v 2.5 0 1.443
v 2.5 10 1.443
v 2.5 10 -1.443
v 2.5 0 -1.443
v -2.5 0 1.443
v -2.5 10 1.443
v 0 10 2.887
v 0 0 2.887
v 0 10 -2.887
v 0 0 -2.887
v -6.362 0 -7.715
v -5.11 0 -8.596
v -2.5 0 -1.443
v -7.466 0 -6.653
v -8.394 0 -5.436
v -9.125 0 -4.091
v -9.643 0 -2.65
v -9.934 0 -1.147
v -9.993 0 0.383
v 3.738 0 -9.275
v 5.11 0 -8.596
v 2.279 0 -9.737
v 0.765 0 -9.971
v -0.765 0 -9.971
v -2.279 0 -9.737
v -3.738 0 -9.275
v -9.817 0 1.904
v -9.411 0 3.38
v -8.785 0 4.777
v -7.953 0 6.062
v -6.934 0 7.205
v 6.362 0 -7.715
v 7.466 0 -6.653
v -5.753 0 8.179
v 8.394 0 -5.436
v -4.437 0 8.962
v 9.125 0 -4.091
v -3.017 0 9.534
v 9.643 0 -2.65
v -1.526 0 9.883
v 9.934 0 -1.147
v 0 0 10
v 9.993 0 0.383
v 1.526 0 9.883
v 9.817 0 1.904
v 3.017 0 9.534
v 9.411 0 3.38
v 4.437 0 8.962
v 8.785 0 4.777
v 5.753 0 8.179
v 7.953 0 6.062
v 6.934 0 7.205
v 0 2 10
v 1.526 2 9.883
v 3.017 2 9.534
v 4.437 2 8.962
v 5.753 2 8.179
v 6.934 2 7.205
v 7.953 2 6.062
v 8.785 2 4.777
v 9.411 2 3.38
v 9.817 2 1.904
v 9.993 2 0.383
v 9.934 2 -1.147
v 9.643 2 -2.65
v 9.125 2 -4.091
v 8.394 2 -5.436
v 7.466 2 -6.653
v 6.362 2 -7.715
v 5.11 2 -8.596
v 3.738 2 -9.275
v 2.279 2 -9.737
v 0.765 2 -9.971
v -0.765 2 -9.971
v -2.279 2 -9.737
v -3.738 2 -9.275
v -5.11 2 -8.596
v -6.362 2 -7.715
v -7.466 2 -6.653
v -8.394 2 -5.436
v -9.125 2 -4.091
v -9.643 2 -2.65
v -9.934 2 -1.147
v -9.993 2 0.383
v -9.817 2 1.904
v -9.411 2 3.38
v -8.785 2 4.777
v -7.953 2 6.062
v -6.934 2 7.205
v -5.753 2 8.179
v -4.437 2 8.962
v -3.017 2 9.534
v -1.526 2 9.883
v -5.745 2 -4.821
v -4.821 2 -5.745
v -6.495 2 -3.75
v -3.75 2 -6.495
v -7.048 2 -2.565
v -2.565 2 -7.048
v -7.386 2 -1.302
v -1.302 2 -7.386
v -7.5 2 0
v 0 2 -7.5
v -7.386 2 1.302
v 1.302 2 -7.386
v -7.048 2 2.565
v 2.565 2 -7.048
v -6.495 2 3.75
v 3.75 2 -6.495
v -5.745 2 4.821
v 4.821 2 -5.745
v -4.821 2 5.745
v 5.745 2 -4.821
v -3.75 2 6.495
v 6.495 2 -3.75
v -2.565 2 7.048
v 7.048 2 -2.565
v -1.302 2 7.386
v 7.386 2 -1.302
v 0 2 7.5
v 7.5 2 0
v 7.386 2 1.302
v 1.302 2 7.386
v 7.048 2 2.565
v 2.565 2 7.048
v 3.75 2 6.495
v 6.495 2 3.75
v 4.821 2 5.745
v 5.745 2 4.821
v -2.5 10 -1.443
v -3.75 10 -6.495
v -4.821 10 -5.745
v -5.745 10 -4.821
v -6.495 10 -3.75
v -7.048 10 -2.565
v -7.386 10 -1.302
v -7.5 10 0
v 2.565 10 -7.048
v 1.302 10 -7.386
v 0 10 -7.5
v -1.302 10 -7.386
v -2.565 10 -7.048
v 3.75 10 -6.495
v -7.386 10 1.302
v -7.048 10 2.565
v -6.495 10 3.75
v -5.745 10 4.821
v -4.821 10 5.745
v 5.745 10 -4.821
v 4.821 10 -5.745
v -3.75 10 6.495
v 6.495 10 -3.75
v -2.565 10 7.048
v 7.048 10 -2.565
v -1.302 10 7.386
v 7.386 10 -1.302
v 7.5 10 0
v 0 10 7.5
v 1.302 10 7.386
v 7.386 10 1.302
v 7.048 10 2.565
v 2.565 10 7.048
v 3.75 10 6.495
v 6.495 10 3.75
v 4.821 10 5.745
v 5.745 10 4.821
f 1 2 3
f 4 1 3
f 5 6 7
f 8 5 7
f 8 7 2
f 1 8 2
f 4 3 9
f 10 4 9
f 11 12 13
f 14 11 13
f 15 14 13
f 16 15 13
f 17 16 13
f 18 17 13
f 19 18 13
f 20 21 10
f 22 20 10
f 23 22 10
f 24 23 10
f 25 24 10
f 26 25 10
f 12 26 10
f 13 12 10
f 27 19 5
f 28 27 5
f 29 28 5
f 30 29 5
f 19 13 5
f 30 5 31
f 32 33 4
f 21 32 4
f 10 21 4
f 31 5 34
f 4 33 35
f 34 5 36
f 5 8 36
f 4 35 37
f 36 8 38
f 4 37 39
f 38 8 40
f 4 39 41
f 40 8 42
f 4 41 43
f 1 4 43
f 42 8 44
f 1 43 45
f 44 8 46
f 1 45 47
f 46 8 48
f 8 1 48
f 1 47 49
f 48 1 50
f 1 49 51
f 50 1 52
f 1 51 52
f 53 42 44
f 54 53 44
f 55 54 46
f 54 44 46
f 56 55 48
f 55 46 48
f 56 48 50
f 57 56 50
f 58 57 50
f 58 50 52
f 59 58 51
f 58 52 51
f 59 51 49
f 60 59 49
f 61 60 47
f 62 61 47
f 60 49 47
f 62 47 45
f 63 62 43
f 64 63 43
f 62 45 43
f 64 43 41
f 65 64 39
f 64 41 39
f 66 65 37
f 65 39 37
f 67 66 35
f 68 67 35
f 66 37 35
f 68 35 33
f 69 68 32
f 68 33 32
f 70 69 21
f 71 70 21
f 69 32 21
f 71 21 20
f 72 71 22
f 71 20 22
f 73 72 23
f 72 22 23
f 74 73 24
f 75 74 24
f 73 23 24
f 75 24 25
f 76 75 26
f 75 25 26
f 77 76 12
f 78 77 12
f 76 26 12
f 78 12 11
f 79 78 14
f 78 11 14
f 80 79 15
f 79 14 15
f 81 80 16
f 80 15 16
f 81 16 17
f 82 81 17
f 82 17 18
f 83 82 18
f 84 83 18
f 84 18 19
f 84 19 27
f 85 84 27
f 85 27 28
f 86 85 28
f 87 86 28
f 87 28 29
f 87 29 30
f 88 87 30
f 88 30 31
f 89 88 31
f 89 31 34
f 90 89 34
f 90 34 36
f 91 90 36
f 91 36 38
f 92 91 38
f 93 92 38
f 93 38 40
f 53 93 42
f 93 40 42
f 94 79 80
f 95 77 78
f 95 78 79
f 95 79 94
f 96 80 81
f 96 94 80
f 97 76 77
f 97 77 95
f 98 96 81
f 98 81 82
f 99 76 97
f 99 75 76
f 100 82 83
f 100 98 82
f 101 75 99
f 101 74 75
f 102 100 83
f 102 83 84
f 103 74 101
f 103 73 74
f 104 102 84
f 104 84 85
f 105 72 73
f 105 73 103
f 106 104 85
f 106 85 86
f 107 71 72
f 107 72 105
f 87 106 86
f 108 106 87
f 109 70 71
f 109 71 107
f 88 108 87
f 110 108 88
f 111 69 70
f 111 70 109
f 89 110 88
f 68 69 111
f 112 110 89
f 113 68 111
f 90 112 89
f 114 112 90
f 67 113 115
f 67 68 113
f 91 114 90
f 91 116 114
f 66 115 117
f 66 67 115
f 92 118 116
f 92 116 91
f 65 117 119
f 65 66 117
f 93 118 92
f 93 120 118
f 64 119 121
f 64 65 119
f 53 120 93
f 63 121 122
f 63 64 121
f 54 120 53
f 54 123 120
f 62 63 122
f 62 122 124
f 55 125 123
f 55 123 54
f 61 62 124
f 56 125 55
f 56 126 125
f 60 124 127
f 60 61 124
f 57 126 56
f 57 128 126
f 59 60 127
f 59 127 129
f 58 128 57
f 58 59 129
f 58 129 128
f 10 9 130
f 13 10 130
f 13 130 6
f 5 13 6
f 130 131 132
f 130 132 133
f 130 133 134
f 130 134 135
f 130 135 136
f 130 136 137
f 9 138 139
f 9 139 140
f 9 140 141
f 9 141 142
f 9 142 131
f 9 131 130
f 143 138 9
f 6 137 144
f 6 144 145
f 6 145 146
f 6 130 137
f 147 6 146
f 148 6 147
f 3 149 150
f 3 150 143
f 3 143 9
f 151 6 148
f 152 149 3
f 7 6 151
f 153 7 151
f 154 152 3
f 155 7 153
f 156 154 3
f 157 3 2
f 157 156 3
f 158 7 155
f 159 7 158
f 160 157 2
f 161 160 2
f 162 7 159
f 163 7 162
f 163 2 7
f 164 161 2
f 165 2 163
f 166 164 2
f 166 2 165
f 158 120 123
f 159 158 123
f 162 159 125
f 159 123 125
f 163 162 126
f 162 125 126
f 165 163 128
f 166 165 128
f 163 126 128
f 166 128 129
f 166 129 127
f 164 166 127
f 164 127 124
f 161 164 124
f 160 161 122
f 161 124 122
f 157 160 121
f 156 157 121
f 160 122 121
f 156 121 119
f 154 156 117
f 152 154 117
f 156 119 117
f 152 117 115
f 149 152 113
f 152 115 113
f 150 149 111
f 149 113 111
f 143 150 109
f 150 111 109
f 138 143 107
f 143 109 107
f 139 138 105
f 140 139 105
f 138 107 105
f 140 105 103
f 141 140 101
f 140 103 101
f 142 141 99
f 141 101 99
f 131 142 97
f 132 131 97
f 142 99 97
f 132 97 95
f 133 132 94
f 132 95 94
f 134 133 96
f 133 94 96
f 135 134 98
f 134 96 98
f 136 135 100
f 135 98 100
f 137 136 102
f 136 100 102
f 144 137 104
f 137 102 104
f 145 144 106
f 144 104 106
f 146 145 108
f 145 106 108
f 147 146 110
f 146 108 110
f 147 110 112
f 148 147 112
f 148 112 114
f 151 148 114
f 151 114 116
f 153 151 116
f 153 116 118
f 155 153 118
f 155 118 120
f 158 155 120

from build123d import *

# Parameters (mm, degrees)
SKETCH1_R           = 10
BOSS_EXTRUDE1_DEPTH = 2
SKETCH2_R           = 7.5
BOSS_EXTRUDE2_DEPTH = 8
CUT_EXTRUDE2_REACH  = 19.321


with BuildPart() as part:
    # Sketch1 → Boss-Extrude1 (new body)
    with BuildSketch(Plane(origin=(0, 0, 0), x_dir=(1, 0, 0), z_dir=(0, 1, 0))):
        with Locations(Location((0, 0, 0), (0, 0, 270))):
            Circle(SKETCH1_R)
    extrude(amount=BOSS_EXTRUDE1_DEPTH)

    # Sketch2 → Boss-Extrude2 (add)
    with BuildSketch(Plane(origin=(0, 2, 0), x_dir=(1, 0, 0), z_dir=(0, 1, 0))):
        with Locations(Location((0, 0, 0), (0, 0, 270))):
            Circle(SKETCH2_R)
    extrude(amount=BOSS_EXTRUDE2_DEPTH)

    # Sketch4 → Cut-Extrude2 (cut, up to next)
    with BuildSketch(Plane(origin=(0, 10, 0), x_dir=(1, 0, 0), z_dir=(0, 1, 0)), mode=Mode.PRIVATE) as cut_extrude2_sk1:
        Polygon((2.5, 1.443375673), (0, 2.886751346), (-2.5, 1.443375673), (-2.5, -1.443375673), (0, -2.886751346), (2.5, -1.443375673), align=None)
    cut_extrude2_tool1 = extrude(cut_extrude2_sk1.sketch, amount=-CUT_EXTRUDE2_REACH, mode=Mode.PRIVATE) & part.part
    add(cut_extrude2_tool1.solids().sort_by_distance((0, 10, 0))[0], mode=Mode.SUBTRACT)


solid = part.part
